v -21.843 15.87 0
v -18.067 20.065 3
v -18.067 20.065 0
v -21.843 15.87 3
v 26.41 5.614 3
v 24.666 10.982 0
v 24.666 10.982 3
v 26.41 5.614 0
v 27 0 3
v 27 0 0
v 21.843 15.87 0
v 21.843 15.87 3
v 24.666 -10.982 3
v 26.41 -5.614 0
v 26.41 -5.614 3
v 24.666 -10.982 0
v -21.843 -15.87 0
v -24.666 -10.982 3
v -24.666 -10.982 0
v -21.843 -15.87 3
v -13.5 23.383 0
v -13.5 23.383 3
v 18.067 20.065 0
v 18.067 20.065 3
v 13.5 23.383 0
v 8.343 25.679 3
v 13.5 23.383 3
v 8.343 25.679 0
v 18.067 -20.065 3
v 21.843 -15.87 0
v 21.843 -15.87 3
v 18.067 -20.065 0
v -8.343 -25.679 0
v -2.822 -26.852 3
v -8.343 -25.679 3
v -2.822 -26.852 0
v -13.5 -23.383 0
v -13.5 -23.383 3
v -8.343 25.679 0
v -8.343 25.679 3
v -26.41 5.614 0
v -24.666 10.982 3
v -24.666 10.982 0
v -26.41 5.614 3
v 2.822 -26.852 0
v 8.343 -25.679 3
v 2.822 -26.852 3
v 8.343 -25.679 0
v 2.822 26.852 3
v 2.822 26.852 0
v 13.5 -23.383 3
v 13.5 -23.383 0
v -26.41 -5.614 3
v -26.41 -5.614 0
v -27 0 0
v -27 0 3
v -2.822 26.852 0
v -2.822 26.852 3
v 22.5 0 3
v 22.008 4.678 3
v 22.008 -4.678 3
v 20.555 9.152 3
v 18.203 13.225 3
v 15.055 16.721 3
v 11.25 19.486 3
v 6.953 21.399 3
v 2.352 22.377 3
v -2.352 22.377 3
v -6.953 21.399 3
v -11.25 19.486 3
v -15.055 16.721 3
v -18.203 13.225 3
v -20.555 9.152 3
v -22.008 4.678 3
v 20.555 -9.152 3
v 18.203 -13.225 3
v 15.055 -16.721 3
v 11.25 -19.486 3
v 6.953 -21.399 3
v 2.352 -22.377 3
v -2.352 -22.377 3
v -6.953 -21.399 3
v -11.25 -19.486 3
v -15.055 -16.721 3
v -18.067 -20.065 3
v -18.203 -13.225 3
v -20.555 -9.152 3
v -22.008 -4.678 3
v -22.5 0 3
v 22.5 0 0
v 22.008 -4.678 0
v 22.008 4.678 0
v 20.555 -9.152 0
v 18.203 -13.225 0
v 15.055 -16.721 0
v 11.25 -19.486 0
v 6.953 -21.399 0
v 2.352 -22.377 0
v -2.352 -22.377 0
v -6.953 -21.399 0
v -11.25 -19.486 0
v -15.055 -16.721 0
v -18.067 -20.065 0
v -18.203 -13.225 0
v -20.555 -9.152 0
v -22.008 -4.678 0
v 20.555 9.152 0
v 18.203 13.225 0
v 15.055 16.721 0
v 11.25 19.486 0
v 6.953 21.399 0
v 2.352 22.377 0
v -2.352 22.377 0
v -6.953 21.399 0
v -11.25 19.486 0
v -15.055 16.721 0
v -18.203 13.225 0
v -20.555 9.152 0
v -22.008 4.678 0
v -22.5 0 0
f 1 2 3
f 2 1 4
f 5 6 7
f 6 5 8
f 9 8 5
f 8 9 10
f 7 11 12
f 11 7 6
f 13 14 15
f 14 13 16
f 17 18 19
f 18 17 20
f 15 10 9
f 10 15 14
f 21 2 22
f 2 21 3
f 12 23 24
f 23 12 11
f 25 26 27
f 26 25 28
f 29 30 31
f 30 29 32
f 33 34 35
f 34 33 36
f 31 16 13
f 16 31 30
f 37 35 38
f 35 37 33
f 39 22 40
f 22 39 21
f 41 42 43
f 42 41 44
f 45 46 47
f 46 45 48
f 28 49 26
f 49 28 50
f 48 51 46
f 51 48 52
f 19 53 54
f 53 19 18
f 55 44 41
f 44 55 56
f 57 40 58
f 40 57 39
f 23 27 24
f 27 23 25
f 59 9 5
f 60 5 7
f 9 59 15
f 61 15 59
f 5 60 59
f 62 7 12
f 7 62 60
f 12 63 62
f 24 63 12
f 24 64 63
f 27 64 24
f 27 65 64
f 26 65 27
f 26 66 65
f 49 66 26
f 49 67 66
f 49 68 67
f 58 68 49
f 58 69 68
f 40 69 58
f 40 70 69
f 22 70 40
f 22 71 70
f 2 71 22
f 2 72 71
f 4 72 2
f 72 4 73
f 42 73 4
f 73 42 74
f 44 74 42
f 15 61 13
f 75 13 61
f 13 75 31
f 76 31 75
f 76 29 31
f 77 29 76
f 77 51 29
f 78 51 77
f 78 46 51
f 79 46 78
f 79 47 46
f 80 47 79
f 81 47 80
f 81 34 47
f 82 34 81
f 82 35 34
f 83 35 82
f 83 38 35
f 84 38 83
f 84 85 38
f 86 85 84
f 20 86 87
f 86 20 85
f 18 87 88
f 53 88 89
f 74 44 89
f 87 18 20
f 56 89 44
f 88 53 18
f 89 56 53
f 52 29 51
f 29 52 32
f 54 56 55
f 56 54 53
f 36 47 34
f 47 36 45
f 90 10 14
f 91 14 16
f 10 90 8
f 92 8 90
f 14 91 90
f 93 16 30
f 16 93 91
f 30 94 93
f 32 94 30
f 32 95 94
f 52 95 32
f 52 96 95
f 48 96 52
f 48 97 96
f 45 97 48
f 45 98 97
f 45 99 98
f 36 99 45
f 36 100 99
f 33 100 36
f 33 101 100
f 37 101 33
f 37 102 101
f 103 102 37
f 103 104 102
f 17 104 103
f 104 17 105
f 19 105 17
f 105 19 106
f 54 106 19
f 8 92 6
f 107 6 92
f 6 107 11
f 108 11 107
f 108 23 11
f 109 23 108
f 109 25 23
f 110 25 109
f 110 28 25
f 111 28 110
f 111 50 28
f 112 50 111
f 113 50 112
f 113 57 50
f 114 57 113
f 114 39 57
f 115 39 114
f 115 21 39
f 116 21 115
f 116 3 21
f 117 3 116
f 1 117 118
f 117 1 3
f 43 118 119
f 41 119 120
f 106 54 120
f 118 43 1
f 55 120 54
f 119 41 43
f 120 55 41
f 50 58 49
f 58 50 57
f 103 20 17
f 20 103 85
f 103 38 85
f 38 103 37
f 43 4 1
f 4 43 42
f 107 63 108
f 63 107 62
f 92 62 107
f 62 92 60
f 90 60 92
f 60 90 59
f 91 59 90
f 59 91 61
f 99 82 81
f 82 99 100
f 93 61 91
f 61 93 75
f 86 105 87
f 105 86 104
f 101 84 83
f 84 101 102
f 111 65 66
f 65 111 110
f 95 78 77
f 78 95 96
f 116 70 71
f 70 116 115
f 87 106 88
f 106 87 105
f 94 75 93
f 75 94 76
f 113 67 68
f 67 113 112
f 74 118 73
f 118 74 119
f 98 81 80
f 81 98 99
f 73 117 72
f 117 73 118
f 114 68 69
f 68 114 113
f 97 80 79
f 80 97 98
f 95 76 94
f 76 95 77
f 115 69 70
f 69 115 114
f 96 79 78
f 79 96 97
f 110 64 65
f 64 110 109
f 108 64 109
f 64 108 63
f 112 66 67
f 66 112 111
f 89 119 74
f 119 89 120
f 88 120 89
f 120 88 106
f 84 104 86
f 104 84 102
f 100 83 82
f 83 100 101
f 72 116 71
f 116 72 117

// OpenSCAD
difference() {
	cylinder(h = 3.0, r = 27.0);
	cylinder(h = 3.0, r = 22.5);
}
